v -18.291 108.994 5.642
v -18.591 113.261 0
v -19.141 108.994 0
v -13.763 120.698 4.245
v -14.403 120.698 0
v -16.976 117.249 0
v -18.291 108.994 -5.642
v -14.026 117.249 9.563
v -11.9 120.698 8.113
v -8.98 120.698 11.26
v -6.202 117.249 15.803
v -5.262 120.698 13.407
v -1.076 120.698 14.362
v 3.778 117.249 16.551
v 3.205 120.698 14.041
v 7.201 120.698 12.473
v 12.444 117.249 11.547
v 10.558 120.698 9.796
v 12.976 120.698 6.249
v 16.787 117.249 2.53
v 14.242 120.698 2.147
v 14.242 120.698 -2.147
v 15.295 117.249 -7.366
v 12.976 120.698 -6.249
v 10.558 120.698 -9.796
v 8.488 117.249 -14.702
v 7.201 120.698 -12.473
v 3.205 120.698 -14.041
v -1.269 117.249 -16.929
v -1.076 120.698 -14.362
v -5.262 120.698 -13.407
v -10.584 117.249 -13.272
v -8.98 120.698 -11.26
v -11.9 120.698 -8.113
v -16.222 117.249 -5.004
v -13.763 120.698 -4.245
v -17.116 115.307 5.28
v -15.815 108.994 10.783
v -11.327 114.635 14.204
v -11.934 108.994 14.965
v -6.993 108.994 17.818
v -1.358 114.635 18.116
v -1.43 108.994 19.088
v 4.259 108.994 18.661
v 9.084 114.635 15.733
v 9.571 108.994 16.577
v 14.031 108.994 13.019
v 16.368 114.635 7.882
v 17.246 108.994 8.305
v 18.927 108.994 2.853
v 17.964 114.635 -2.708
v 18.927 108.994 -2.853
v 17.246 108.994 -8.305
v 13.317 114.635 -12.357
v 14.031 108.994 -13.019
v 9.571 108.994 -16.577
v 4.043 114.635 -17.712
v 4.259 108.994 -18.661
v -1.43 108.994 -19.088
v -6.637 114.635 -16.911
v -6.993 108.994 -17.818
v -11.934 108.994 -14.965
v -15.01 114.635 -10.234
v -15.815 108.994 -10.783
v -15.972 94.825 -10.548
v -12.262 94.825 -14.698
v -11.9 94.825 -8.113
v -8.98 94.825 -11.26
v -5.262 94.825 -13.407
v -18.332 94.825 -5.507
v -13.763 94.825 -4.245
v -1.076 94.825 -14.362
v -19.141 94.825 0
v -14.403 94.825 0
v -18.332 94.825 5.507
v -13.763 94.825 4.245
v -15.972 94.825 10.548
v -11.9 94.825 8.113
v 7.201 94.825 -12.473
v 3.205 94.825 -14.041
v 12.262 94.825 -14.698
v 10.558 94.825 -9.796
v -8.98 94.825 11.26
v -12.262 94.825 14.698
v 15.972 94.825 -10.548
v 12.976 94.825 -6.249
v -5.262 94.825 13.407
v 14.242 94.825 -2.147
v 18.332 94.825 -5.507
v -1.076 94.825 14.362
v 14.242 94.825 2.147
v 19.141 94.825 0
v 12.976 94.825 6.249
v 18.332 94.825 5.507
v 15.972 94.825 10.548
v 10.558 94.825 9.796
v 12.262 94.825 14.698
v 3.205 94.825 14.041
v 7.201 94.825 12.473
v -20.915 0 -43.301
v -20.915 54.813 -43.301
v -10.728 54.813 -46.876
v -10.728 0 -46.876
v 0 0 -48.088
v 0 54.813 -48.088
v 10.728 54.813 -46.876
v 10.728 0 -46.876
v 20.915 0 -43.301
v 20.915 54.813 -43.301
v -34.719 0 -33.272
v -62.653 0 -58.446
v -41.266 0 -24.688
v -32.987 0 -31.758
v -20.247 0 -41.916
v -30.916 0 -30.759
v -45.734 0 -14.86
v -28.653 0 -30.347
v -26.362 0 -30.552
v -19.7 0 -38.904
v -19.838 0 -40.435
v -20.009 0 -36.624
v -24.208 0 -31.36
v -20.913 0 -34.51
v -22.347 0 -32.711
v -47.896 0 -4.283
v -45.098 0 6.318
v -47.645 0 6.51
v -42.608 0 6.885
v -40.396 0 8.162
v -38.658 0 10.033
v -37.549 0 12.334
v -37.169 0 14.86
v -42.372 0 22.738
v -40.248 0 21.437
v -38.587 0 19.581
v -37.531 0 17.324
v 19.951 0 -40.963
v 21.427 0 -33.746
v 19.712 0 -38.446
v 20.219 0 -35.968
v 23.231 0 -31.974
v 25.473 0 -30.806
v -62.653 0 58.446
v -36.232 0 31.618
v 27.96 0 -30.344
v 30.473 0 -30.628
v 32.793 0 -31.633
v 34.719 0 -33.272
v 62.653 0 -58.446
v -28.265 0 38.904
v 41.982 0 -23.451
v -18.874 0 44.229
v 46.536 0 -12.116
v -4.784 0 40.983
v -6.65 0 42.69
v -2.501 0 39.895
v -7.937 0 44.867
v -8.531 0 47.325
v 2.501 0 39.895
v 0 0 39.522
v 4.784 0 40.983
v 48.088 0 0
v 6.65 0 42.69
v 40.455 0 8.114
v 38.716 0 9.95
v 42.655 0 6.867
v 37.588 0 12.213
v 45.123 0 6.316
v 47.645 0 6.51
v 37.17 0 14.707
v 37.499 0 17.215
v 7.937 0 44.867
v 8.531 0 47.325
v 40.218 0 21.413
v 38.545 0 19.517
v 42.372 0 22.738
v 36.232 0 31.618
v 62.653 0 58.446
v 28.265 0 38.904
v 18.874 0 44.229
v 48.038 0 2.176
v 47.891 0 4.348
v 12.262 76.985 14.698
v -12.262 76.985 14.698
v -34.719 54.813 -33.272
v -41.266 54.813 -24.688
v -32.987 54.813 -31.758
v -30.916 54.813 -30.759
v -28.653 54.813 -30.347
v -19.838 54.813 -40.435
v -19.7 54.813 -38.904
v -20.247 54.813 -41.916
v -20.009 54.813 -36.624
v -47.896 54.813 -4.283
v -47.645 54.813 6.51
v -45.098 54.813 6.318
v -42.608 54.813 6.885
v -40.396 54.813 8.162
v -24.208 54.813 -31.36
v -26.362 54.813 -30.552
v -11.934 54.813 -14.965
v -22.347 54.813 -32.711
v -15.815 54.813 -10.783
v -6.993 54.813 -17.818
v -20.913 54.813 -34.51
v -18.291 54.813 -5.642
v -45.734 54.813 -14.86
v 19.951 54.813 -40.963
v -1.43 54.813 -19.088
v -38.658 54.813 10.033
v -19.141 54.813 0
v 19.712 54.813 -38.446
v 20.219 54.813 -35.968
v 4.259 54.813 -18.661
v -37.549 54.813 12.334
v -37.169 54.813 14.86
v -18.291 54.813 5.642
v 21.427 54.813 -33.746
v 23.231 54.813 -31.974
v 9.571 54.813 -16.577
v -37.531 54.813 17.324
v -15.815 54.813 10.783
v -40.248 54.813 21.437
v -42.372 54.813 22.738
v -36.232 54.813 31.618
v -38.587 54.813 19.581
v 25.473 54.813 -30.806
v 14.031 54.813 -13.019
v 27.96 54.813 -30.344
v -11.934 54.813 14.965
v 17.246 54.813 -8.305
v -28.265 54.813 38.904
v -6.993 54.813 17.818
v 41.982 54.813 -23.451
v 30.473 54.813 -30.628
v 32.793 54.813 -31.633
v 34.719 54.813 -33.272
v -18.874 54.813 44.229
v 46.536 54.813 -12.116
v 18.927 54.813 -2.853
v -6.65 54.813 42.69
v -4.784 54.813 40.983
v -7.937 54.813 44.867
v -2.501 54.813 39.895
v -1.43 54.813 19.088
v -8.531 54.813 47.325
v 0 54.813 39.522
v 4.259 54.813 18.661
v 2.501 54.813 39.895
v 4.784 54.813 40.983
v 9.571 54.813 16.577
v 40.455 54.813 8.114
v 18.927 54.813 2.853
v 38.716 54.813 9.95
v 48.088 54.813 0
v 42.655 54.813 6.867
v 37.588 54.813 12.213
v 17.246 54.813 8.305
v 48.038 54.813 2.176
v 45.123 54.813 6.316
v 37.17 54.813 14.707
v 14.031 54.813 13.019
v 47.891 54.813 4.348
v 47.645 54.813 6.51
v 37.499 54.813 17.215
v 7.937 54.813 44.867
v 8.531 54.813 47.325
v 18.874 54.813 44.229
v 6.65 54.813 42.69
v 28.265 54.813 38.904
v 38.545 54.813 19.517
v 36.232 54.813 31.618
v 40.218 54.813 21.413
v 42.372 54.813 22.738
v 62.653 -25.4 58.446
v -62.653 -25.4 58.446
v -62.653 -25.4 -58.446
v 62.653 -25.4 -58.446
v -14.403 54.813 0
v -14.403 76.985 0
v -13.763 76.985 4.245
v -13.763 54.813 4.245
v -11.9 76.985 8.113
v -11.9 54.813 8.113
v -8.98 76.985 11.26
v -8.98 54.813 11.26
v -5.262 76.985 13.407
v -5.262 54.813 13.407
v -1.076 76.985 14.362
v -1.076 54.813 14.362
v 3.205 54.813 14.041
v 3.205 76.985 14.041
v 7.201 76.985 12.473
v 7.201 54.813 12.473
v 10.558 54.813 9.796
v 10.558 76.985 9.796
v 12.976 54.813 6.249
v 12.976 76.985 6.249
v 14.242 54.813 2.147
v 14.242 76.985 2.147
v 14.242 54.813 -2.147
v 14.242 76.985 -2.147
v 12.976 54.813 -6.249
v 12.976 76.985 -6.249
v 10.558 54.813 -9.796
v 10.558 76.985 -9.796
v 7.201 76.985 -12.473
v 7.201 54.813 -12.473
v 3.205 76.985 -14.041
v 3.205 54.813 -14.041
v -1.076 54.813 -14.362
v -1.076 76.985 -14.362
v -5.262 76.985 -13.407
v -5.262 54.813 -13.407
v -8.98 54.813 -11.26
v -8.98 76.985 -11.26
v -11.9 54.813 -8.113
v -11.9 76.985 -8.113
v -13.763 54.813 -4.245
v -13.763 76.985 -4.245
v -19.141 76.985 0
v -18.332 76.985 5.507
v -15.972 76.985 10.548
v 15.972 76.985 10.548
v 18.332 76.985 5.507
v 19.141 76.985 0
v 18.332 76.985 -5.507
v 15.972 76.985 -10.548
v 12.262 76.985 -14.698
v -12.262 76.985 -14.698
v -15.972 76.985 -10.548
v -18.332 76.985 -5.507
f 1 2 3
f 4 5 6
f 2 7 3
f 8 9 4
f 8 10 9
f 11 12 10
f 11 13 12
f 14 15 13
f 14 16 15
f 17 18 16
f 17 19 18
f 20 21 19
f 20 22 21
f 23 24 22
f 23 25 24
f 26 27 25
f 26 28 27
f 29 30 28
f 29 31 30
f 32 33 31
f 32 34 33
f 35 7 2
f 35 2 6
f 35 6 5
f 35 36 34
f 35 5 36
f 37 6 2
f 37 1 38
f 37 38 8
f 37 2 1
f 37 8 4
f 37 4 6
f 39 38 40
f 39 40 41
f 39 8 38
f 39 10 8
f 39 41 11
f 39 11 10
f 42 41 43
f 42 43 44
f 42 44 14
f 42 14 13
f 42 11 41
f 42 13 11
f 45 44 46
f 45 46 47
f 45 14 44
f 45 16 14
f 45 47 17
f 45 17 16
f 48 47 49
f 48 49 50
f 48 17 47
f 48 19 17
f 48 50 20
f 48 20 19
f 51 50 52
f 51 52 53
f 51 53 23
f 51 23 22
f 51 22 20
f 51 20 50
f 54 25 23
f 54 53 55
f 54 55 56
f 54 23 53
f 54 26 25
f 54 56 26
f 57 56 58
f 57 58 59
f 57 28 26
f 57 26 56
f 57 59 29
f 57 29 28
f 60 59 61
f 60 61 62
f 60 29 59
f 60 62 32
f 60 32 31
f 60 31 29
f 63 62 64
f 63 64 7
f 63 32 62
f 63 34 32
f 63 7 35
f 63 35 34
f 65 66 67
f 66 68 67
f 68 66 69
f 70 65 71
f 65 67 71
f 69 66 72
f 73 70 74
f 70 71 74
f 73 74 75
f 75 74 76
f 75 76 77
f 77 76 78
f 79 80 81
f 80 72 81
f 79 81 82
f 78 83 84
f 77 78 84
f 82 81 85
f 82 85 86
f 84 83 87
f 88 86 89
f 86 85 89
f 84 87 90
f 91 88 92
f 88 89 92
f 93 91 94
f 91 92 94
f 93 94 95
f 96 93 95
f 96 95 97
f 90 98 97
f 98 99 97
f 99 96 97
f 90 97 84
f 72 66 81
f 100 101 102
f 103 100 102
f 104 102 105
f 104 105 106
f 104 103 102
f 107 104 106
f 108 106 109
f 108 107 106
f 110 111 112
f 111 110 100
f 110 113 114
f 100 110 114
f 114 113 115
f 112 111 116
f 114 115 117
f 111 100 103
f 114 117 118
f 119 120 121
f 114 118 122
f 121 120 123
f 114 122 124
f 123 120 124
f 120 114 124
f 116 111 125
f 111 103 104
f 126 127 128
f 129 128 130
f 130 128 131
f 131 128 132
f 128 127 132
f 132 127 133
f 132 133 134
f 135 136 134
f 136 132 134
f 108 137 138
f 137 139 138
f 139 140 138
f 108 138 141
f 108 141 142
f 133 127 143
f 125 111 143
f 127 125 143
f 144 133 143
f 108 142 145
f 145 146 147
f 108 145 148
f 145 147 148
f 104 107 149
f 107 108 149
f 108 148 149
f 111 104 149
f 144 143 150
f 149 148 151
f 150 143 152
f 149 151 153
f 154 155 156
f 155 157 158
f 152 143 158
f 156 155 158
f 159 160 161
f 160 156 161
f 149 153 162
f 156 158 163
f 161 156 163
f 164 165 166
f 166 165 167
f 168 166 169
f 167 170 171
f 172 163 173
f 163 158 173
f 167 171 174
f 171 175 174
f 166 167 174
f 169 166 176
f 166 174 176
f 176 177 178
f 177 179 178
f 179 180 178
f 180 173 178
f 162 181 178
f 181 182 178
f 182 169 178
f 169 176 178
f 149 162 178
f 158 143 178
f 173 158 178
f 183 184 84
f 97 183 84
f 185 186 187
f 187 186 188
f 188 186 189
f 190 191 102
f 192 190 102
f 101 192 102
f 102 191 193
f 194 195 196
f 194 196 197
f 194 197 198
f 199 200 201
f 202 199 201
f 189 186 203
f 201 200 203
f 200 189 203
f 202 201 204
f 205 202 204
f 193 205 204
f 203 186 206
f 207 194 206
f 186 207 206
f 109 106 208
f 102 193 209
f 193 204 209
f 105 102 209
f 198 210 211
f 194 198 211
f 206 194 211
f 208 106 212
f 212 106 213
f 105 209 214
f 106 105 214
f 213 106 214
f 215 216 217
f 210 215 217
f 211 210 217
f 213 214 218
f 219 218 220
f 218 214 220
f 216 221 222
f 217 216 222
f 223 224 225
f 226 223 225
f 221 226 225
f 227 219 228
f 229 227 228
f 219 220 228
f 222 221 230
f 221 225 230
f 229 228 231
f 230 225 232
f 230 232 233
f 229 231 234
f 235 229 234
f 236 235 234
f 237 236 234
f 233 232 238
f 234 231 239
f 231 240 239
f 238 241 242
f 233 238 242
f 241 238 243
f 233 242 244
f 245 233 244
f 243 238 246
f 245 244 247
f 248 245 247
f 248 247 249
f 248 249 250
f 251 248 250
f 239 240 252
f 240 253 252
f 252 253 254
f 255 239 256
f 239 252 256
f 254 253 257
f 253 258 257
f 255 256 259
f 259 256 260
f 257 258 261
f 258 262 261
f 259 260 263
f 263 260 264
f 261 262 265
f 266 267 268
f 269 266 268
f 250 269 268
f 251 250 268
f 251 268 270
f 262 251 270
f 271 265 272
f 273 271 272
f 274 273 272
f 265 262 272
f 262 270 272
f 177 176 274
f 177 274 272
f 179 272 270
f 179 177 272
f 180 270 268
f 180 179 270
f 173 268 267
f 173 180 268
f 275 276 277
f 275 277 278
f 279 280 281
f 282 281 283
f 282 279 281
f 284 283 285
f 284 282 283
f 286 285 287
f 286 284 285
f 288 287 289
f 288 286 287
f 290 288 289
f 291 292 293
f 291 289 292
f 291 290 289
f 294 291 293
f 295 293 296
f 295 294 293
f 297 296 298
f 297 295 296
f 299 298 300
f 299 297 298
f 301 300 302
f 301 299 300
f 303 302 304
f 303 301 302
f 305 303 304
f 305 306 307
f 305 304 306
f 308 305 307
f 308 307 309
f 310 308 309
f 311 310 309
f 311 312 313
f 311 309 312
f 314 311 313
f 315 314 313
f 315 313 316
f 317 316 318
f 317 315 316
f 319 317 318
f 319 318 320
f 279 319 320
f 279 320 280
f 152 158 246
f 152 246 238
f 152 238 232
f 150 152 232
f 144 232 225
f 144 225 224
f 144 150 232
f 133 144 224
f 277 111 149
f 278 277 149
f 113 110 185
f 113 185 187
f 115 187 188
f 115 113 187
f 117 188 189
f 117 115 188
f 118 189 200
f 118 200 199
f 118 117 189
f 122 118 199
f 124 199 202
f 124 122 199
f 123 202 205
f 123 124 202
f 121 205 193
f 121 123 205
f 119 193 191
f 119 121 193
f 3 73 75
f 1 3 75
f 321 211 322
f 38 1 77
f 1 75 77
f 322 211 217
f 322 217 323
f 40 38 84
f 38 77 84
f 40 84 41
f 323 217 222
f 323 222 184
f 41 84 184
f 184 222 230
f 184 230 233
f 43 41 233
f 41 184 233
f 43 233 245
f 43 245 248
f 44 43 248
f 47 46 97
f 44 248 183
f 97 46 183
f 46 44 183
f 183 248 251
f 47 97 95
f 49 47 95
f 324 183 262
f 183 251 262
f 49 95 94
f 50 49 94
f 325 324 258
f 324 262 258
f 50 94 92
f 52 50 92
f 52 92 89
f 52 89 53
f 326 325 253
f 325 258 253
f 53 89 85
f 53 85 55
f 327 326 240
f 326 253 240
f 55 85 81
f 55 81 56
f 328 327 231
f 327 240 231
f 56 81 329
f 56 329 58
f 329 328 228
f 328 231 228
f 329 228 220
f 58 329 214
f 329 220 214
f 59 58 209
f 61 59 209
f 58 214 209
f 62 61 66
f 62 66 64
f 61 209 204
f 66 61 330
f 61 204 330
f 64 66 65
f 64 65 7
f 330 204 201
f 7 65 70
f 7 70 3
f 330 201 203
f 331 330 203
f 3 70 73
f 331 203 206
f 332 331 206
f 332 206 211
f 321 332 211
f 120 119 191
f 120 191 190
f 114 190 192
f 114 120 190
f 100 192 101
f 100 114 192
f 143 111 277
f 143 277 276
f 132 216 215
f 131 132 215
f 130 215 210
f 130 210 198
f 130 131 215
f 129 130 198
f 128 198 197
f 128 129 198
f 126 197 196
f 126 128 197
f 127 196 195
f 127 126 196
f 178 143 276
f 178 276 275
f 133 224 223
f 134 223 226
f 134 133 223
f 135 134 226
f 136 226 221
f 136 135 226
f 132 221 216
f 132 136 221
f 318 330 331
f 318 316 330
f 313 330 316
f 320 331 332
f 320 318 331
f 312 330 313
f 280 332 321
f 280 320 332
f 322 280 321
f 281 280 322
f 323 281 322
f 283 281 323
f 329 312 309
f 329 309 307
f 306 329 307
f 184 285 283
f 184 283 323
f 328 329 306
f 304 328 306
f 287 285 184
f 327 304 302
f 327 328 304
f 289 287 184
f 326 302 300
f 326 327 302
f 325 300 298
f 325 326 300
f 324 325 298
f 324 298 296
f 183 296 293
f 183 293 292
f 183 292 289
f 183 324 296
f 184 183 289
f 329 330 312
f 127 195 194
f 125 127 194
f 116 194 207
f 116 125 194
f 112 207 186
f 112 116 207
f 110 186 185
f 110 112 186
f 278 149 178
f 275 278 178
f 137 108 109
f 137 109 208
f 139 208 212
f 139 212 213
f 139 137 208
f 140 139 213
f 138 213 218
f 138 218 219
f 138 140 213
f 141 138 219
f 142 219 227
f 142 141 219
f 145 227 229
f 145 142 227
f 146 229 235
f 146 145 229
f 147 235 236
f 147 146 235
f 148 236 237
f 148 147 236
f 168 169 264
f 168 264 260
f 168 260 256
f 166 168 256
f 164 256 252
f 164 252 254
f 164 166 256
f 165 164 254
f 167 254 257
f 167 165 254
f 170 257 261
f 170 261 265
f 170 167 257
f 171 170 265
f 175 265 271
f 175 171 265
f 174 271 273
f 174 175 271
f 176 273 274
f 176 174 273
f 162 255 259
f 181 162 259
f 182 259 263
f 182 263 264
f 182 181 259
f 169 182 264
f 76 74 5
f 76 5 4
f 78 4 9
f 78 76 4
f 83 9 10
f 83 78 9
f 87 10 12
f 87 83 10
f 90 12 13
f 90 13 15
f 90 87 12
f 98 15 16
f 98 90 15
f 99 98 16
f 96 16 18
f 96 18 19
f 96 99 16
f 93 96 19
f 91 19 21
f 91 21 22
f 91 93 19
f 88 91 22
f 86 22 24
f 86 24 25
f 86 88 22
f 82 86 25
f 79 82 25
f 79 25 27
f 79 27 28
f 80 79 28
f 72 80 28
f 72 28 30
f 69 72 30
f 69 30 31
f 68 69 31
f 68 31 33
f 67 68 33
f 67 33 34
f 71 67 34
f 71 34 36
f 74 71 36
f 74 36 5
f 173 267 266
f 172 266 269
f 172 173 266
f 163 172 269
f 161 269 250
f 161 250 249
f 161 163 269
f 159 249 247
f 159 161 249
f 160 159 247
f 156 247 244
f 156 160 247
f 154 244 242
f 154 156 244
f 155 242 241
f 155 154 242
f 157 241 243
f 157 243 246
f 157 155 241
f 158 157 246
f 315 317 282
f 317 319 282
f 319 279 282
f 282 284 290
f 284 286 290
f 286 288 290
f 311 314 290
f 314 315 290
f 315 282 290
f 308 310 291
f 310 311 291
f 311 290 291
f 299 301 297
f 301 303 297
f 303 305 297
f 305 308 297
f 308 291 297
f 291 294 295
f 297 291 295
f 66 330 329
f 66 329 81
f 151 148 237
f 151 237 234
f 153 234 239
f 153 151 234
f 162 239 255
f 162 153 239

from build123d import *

# Parameters (mm, degrees)
F0_W          = 125.3066509962
F0_H          = 116.8914437294
F2_DEPTH      = 25.4
F3_DEPTH      = 54.8134744167
F4_R          = 19.141083189
F4_R_2        = 14.402572036
F5_DEPTH      = 65.8841822296
F7_W          = 17.8398638964
F7_H          = 29.3952524662
F8_DEPTH      = 25.4
F8_DEPTH_BACK = 25.4


# Not quite as in the source:
# - a fillet or chamfer that OpenCascade refuses, or shapes differently, is made with other operations: its cross-section is extruded or revolved along the edge and cut away or added


with BuildPart() as f2:
    # F0 (on Front) → F2 (new body)
    with BuildSketch(Plane.XZ):
        Rectangle(F0_W, F0_H)
    extrude(amount=F2_DEPTH)

    # F1 (on face) → F3 (join)
    with BuildSketch(Plane.XZ):
        with BuildLine():
            ThreePointArc((34.7187500455, -33.271908015), (44.6203470202, -17.9286390861), (48.0875396302, 0))
            ThreePointArc((48.0875396302, 0), (47.9767259565, 3.262703507), (47.6447956571, 6.5103697647))
            ThreePointArc((47.6447956571, 6.5103697647), (37.5878279083, 12.213025626), (42.3721487148, 22.7379084564))
            ThreePointArc((42.3721487148, 22.7379084564), (28.2651466136, 38.9036367785), (8.5313219634, 47.3247082742))
            ThreePointArc((8.5313219634, 47.3247082742), (0, 39.5221811368), (-8.5313219634, 47.3247082742))
            ThreePointArc((-8.5313219634, 47.3247082742), (-28.2651466136, 38.9036367785), (-42.3721487148, 22.7379084564))
            ThreePointArc((-42.3721487148, 22.7379084564), (-38.5869212276, 19.5805755678), (-37.1686094245, 14.8598669634))
            ThreePointArc((-37.1686094245, 14.8598669634), (-40.3955017751, 8.1616473967), (-47.6447956571, 6.5103697647))
            ThreePointArc((-47.6447956571, 6.5103697647), (-45.7339679179, -14.8598669634), (-34.7187500455, -33.271908015))
            ThreePointArc((-34.7187500455, -33.271908015), (-25.2578272797, -30.88357465), (-19.6997881202, -38.9036367785))
            ThreePointArc((-19.6997881202, -38.9036367785), (-20.0091221024, -41.1847385714), (-20.9147811398, -43.3010784803))
            ThreePointArc((-20.9147811398, -43.3010784803), (0, -48.0875396302), (20.9147811398, -43.3010784803))
            ThreePointArc((20.9147811398, -43.3010784803), (23.2305552106, -31.9741161944), (34.7187500455, -33.271908015))
        make_face()
    extrude(amount=-F3_DEPTH)

    # F4 (on face) → F5 (join)
    with BuildSketch(Plane(origin=(0, 54.8134744167, 0), x_dir=(-1, 0, 0), z_dir=(0, 1, 0))):
        Circle(F4_R)
        Circle(F4_R_2, mode=Mode.SUBTRACT)
    extrude(amount=F5_DEPTH)

    # F6: fillet of radius 16.8234648582 on 1 edges, made by hand

    # F6_s1 → F6_t2 (revolve, cut)
    with BuildSketch(Plane.XY):
        with BuildLine():
            ThreePointArc((-19.141083189, 108.9936887817), (-17.9115236115, 115.3070941964), (-14.402572036, 120.6976566464))
            Line((-14.402572036, 120.6976566464), (-19.141083189, 120.6976566464))
            Line((-19.141083189, 120.6976566464), (-19.141083189, 108.9936887817))
        make_face()
    revolve(axis=Axis((0, 120.6976566464, 0), (0, 1, 0)), mode=Mode.SUBTRACT)

    # F7 (on Right) → F8 (cut, two sides)
    with BuildSketch(Plane.YZ) as f8_sk:
        with Locations((85.9047025442, 0)):
            Rectangle(F7_W, F7_H)
    extrude(amount=-F8_DEPTH, mode=Mode.SUBTRACT)
    extrude(f8_sk.sketch, amount=F8_DEPTH_BACK, mode=Mode.SUBTRACT)


solid = f2.part
